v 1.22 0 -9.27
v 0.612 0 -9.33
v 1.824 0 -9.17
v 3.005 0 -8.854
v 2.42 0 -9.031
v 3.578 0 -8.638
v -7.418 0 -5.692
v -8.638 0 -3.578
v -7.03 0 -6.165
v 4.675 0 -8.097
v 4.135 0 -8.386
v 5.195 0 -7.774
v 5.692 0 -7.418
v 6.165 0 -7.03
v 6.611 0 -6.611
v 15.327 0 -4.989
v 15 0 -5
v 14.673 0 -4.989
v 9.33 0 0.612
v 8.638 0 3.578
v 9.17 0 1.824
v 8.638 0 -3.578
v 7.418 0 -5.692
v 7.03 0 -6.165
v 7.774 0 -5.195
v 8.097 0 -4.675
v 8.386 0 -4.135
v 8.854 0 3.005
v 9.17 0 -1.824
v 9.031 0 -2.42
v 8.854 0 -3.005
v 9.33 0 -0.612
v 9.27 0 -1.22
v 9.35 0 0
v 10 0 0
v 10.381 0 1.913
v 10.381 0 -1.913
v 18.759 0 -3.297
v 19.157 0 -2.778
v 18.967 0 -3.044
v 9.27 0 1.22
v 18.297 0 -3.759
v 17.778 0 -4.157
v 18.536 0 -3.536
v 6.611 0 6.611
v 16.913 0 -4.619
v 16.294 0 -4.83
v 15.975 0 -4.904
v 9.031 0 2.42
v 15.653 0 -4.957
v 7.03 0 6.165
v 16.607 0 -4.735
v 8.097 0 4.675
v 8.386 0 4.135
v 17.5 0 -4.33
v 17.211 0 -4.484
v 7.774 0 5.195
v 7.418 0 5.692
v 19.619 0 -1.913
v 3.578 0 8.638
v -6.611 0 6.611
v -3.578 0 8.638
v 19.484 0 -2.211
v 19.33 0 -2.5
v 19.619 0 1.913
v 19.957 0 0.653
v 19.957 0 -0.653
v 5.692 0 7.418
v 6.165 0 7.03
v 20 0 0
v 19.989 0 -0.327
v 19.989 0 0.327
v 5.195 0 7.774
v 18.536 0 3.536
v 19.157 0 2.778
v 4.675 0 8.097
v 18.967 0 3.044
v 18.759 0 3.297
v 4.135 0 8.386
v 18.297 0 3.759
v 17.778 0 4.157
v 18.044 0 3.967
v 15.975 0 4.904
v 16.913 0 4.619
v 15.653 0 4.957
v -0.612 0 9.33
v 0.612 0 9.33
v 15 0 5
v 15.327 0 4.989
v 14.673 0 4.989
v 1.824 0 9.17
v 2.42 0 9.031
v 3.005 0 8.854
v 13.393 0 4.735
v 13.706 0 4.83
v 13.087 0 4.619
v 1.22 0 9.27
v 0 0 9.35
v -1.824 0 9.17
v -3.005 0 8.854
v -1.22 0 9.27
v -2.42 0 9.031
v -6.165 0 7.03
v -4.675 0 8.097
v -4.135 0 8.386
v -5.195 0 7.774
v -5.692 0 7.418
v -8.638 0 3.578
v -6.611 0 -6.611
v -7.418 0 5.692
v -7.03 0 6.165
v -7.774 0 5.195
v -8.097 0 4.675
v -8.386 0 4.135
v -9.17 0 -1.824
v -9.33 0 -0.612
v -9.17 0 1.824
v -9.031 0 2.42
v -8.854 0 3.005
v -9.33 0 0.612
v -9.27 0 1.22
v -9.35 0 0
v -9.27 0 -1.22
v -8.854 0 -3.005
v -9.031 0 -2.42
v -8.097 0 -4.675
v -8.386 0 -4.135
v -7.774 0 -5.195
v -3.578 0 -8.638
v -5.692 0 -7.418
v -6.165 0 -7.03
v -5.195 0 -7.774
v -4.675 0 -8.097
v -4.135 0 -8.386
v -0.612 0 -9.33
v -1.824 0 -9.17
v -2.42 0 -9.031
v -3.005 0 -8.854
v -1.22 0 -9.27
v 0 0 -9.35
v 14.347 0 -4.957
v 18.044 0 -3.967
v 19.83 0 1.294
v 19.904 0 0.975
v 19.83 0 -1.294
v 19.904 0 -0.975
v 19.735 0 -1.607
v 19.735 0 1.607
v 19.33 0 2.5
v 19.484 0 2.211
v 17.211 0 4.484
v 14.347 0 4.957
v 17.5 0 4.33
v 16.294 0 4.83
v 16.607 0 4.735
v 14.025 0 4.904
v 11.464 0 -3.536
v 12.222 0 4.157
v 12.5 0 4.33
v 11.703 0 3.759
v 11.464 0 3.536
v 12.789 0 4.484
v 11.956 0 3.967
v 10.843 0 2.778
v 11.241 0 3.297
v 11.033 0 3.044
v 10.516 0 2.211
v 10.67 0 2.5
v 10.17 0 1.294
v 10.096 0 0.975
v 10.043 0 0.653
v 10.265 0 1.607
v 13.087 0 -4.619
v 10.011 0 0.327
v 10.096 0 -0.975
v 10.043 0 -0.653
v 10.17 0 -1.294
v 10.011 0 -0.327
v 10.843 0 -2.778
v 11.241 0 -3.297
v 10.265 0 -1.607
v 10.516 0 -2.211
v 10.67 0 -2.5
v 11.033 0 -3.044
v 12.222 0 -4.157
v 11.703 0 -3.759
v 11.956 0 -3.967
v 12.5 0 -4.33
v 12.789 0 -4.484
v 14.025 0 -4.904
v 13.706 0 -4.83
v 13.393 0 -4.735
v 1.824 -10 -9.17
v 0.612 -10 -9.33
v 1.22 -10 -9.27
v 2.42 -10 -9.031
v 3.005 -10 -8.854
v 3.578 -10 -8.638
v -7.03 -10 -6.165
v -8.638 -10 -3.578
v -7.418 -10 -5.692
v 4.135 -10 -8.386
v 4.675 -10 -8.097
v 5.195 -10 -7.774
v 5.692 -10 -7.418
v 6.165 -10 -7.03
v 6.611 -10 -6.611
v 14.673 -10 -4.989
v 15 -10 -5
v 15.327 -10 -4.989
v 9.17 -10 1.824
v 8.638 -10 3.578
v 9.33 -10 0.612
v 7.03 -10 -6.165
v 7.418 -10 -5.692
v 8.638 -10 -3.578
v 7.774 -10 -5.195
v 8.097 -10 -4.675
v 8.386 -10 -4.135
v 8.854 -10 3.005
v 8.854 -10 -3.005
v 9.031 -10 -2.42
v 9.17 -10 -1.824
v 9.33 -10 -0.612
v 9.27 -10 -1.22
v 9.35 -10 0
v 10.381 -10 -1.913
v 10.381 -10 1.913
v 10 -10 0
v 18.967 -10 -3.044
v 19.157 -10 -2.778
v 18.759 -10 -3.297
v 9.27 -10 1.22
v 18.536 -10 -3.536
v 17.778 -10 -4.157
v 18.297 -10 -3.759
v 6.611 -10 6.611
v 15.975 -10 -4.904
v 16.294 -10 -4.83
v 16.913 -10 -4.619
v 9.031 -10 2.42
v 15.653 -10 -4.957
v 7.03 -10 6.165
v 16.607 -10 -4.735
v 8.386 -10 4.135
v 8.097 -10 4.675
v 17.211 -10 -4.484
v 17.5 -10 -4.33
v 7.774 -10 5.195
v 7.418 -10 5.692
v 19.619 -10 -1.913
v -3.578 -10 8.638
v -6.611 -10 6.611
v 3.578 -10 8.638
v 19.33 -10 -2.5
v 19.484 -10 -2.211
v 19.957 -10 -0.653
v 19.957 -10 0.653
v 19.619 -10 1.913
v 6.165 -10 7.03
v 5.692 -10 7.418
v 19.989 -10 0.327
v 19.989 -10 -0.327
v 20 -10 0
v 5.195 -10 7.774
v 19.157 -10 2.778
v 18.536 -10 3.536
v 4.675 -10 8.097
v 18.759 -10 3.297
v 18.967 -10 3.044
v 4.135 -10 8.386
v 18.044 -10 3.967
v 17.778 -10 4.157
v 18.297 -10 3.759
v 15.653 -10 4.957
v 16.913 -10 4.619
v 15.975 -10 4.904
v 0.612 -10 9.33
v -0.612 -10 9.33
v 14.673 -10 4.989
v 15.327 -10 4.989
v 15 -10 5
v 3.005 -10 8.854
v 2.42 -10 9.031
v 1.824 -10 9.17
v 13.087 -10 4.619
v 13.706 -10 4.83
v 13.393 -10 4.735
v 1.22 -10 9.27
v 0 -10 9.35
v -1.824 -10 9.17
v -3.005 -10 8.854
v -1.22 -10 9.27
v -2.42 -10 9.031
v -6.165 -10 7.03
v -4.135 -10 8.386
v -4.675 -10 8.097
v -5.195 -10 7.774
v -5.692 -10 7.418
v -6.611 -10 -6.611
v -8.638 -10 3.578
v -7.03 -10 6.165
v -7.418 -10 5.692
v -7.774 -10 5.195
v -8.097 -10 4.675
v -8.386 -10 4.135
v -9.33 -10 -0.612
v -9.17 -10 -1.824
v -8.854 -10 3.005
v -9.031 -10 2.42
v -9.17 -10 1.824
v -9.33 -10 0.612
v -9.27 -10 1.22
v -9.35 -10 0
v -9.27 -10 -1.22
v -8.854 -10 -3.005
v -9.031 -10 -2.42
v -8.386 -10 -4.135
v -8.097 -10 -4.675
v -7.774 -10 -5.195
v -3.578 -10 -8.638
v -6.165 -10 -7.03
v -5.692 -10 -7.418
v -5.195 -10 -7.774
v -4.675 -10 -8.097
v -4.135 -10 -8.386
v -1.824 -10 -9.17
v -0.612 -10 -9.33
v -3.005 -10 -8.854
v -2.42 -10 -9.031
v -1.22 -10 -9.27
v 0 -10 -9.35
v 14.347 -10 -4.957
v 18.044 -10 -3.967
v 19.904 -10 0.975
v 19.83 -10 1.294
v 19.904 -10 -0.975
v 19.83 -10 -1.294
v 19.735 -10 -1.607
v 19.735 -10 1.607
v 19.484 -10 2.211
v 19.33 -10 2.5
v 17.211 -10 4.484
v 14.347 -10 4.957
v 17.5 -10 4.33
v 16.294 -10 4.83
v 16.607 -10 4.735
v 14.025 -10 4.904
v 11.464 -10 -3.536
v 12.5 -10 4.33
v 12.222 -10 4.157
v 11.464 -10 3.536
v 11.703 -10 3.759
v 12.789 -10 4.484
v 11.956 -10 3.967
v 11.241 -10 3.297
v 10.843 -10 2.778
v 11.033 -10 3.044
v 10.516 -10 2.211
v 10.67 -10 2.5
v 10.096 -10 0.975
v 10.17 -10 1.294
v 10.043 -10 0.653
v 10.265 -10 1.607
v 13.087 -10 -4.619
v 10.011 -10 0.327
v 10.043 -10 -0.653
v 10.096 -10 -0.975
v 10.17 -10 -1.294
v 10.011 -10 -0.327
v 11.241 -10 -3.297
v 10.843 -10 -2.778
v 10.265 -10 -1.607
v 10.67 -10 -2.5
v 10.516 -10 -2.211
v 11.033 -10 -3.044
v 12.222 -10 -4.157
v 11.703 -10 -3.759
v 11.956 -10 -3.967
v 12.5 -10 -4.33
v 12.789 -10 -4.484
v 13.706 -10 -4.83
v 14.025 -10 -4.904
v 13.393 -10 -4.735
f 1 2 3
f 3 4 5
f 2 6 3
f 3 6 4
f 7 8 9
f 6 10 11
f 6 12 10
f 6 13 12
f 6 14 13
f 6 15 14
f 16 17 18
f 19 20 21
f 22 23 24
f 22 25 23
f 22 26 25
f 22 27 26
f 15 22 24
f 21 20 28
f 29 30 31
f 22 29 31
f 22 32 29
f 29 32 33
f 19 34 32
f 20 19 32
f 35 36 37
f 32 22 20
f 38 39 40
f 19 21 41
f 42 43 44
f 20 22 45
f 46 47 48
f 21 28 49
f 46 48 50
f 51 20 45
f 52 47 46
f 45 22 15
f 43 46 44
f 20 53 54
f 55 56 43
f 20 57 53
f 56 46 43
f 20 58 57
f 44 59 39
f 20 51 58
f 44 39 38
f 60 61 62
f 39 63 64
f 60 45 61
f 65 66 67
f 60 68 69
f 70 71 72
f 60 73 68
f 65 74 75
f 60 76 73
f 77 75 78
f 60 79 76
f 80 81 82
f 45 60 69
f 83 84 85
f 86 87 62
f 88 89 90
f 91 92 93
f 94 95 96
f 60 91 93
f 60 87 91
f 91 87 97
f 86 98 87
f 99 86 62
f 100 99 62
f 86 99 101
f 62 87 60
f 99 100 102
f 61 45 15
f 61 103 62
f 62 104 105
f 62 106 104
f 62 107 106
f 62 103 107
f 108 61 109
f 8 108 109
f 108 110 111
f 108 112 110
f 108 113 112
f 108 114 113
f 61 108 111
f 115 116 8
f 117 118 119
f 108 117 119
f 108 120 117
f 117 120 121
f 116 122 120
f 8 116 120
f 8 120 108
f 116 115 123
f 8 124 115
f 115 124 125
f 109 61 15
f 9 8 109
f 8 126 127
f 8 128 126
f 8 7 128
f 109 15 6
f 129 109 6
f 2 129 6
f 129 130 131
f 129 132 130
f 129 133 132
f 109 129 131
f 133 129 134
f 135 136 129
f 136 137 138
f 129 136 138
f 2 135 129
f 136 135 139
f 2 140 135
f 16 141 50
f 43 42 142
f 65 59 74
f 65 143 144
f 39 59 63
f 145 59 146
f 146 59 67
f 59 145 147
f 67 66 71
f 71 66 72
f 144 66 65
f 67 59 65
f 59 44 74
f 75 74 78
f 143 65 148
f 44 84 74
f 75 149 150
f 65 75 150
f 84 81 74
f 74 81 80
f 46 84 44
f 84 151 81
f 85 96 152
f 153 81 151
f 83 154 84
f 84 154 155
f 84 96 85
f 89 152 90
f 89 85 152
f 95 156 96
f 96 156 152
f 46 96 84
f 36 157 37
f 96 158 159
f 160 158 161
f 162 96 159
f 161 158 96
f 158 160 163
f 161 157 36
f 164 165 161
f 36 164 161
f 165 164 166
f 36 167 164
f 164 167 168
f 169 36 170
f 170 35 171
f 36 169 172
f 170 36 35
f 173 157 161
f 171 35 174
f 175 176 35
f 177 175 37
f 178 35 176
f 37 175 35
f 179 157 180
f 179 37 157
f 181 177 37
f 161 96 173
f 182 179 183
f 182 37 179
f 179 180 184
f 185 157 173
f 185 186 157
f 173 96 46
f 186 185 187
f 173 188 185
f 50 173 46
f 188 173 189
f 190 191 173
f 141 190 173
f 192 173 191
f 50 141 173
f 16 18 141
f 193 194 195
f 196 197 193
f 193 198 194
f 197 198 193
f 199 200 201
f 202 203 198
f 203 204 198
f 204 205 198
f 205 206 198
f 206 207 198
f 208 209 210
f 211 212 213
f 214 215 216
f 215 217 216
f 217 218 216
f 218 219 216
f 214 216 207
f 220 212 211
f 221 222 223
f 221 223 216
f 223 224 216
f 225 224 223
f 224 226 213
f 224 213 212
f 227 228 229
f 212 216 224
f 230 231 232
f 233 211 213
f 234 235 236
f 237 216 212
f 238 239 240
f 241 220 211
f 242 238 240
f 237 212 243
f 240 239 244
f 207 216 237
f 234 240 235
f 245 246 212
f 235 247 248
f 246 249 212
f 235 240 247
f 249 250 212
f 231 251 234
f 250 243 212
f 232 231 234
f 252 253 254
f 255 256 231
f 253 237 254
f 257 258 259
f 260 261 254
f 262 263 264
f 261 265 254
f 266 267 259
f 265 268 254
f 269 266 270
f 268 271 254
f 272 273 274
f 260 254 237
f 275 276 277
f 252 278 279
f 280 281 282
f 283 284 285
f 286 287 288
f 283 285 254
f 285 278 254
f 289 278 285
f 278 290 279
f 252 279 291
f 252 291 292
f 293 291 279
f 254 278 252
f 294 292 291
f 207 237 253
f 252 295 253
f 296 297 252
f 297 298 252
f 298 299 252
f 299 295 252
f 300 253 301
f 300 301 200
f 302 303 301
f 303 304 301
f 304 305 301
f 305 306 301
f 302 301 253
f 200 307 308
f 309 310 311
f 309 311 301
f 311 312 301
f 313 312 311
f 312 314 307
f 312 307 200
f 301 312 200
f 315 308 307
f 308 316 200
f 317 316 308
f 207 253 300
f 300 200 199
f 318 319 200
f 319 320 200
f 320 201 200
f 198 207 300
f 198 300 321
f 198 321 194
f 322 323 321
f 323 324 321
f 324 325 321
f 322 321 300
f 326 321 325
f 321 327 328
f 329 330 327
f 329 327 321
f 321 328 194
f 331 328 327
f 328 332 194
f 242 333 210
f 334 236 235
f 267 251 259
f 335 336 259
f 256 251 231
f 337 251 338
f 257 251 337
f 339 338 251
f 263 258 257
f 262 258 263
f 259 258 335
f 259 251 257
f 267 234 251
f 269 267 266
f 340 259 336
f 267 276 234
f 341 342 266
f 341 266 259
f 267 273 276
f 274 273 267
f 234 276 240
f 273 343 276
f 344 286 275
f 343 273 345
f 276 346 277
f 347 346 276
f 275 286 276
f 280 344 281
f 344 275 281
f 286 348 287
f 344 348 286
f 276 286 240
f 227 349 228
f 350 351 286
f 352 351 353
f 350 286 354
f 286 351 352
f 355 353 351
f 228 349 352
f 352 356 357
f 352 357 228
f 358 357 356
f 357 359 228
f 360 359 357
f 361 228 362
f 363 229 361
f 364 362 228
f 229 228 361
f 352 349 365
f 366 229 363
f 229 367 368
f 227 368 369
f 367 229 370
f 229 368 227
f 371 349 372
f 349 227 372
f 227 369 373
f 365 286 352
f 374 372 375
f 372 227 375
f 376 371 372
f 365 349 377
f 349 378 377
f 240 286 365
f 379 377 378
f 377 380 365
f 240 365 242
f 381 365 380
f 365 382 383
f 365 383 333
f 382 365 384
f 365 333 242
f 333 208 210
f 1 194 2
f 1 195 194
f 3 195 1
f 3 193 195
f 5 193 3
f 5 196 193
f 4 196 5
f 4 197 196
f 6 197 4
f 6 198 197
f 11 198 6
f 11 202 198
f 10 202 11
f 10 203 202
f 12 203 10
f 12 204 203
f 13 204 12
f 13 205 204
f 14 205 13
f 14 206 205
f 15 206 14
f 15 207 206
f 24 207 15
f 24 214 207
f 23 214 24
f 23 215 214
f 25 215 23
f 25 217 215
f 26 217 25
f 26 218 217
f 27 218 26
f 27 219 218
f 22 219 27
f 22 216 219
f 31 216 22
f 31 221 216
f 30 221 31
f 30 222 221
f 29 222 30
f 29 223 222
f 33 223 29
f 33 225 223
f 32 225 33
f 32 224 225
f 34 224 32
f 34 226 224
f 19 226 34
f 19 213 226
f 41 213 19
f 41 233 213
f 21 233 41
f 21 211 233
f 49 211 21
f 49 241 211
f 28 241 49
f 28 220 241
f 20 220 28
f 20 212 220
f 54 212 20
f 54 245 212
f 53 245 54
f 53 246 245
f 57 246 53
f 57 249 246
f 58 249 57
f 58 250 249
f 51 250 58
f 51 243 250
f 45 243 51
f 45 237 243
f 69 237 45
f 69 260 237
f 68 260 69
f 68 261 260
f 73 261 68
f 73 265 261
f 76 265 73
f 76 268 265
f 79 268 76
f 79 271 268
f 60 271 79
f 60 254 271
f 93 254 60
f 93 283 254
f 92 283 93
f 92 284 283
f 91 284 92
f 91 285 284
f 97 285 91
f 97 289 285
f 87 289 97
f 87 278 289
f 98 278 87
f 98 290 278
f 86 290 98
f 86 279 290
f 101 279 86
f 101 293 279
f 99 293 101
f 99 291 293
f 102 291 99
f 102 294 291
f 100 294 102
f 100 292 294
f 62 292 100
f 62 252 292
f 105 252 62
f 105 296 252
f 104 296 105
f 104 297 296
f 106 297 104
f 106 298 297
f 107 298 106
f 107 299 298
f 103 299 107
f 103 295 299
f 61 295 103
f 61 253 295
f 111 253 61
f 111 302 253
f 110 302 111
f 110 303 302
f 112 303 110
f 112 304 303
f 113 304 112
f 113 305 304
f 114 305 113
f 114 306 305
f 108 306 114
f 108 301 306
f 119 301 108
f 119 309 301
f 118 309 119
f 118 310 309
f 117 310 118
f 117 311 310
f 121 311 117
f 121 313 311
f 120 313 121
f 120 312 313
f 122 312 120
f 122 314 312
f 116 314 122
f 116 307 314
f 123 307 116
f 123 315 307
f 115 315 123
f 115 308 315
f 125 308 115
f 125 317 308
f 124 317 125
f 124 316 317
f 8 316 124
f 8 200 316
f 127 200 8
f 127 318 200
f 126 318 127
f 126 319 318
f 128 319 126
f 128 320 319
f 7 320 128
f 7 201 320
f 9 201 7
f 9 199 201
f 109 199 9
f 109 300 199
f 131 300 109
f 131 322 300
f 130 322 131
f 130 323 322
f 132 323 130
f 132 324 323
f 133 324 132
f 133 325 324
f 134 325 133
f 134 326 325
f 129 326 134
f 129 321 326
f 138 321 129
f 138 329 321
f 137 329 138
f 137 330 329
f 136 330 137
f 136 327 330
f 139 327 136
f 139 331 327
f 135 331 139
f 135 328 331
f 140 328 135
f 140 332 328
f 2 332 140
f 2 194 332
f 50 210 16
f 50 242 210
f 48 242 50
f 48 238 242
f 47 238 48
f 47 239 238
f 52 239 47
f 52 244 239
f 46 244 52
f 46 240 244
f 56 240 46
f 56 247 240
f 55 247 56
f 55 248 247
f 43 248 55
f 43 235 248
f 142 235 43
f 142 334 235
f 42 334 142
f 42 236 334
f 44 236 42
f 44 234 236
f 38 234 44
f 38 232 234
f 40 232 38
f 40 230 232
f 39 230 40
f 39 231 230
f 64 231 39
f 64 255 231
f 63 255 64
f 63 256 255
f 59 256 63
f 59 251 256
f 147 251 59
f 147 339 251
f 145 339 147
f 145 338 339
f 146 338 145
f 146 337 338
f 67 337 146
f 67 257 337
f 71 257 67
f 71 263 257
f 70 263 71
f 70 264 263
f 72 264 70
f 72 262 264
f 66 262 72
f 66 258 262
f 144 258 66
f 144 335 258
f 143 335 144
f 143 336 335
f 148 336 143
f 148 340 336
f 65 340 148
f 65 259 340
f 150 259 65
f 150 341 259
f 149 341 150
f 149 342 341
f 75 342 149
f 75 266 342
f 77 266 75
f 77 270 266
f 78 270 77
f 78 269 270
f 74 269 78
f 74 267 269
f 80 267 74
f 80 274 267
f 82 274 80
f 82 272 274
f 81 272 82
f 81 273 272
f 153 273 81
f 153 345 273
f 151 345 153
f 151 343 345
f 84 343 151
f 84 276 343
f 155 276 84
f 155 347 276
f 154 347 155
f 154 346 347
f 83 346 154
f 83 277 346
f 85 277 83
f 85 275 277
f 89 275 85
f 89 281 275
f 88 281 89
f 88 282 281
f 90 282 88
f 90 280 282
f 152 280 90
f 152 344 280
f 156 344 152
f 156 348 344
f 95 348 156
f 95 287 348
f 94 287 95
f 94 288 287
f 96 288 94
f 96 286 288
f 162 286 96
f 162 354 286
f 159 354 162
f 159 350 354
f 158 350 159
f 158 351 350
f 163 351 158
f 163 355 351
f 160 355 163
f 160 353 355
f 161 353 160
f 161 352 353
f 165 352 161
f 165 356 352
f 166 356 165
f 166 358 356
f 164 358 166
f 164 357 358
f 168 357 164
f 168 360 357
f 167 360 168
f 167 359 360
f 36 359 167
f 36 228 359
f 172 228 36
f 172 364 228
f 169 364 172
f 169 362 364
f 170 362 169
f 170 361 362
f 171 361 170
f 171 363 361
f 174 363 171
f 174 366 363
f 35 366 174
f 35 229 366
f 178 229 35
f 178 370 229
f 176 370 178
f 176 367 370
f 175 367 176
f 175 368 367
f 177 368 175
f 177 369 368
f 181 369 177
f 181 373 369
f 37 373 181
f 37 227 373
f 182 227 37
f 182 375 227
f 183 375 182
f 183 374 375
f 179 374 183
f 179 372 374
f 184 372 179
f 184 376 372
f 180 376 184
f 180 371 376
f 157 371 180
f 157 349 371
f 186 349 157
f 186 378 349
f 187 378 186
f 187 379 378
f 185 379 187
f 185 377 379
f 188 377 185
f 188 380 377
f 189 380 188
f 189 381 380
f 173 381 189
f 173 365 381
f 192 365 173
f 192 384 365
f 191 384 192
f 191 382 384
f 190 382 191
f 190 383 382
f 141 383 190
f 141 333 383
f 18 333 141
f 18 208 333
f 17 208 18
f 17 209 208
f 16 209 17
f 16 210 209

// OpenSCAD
// Snap-on tubing clip for a 12.7 mm (1/2 inch) lab stand rod
// Printed flat: a 10 mm tall extrusion (Z) of a 2-D profile in the XY plane.

// ---------------- Parameters ----------------
rod_d        = 12.7;   // stand rod inner diameter (ring 1)
rod_wall     = 3;      // stand rod ring wall thickness
ring1_od     = rod_d + 2 * rod_wall;  // outer diameter of rod ring (18.7 mm)

tube_d       = 6;      // tubing inner diameter (ring 2)
tube_wall    = 2;      // tubing ring wall thickness
ring2_od     = tube_d + 2 * tube_wall; // outer diameter of tubing ring (10 mm)

bridge_w     = 6;      // solid bridge width (Y)
bridge_x0    = 8;      // bridge start (X)
bridge_x1    = 12;     // bridge end (X)

opening1_w   = 10;     // rod ring opening width (-X side)
opening2_w   = 4.5;    // tubing ring opening width (+X side)

height       = 10;     // extrusion height (Z)

eps          = 0.5;    // cutter overshoot past faces

$fn = 96;              // smoothness of curved shapes

// ---------------- Profile ----------------
// 2-D profile drawn in the XY plane (Y = world Y, not extrusion height).
module profile() {
    union() {
        // Rod ring, centred at origin
        difference() {
            translate([0, 0])
                circle(d = ring1_od);
            // Opening cut out of -X side: x < 0 and -5 < y < 5
            translate([-ring1_od / 2 - eps, -opening1_w / 2, 0])
                cube([eps, opening1_w, height + 2 * eps]);
        }

        // Tubing ring, centred at x = 15, y = 0
        difference() {
            translate([15, 0])
                circle(d = ring2_od);
            // Opening cut out of +X side: x > 15 and -2.25 < y < 2.25
            translate([15, -opening2_w / 2, 0])
                cube([eps, opening2_w, height + 2 * eps]);
        }

        // Solid bridge between x = 8 and x = 12, width 6 (Y)
        translate([bridge_x0, -bridge_w / 2, 0])
            cube([bridge_x1 - bridge_x0, bridge_w, height]);
    }
}

// ---------------- Part ----------------
// Extrude the profile along +Z, resting on z = 0.
module clip() {
    rotate([90, 0, 0])
        linear_extrude(height = height)
            profile();
}

clip();
